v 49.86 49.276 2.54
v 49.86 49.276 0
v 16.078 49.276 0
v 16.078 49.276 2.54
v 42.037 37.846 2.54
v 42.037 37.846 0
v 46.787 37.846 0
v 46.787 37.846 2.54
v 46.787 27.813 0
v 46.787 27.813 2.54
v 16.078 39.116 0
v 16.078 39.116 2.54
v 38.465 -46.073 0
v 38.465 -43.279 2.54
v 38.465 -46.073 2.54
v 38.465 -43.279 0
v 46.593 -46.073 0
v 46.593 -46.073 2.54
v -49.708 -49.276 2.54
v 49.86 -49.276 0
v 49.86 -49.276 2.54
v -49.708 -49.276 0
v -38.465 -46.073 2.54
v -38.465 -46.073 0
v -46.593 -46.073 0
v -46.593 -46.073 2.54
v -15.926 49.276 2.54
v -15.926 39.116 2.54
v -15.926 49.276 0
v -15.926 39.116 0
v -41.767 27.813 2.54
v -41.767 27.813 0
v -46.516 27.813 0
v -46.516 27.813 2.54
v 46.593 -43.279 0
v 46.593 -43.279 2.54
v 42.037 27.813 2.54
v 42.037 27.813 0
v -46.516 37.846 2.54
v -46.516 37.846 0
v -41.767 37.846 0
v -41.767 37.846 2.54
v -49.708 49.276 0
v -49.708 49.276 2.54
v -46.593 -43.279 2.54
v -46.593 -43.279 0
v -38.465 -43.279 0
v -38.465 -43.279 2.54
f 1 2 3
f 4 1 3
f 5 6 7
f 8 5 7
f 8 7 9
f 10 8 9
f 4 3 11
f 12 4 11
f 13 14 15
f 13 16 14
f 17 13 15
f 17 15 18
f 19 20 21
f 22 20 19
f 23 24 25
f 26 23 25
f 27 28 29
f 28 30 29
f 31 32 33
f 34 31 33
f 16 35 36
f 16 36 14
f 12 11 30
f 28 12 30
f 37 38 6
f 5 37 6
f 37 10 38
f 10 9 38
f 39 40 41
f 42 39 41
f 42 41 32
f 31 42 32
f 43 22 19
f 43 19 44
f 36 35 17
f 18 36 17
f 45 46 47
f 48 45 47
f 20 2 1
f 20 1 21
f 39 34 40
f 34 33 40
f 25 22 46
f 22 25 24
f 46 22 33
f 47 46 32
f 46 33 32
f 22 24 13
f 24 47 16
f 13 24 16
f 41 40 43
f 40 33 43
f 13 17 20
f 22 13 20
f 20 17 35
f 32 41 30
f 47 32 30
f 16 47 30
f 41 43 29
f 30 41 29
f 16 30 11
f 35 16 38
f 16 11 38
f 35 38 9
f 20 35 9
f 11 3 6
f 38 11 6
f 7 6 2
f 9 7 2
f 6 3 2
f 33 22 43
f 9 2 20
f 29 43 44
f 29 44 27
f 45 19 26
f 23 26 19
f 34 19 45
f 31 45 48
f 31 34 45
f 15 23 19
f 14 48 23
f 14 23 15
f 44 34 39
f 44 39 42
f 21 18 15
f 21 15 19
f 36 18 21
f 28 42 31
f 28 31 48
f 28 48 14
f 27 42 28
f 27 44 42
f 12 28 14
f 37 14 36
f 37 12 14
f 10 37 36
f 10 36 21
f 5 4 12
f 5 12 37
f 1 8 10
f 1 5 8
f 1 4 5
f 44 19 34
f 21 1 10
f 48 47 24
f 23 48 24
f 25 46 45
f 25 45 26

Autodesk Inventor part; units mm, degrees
ref_plane "YZ Plane" through (0, 0, 0) normal (1, 0, 0) x (0, 1, 0)
ref_plane "XZ Plane" through (0, 0, 0) normal (0, 1, 0) x (-1, 0, 0)
ref_plane "XY Plane" through (0, 0, 0) normal (0, 0, 1) x (1, 0, 0)
sketch "Sketch1" plane through (0, 0, 0) normal (0, 0, 1) x (1, 0, 0)
  line L0 (49.8602, 49.276) -> (49.8602, -49.276)
  line L1 (49.8602, -49.276) -> (-49.7078, -49.276)
  line L2 (-49.7078, -49.276) -> (-49.7078, 49.276)
  line L3 (49.8602, 49.276) -> (16.0782, 49.276)
  line L4 (16.0782, 49.276) -> (16.0782, 39.116)
  line L5 (16.0782, 39.116) -> (-15.9258, 39.116)
  line L6 (-15.9258, 39.116) -> (-15.9258, 49.276)
  line L7 (-49.7078, 49.276) -> (-15.9258, 49.276)
  line L8 (16.0782, 49.276) -> (49.8602, 49.276)
  line L9 (-46.5164, 37.846) -> (-41.7666, 37.846)
  line L10 (-41.7666, 37.846) -> (-41.7666, 27.813)
  line L11 (-41.7666, 27.813) -> (-46.5164, 27.813)
  line L12 (-46.5164, 27.813) -> (-46.5164, 37.846)
  line L13 (42.037, 37.846) -> (46.7868, 37.846)
  line L14 (46.7868, 37.846) -> (46.7868, 27.813)
  line L15 (46.7868, 27.813) -> (42.037, 27.813)
  line L16 (42.037, 27.813) -> (42.037, 37.846)
  line L17 (-46.5926, -43.2793) -> (-46.5926, -46.0733)
  line L18 (-46.5926, -43.2793) -> (-38.4646, -43.2793)
  line L19 (-38.4646, -43.2793) -> (-38.4646, -46.0733)
  line L20 (-38.4646, -46.0733) -> (-46.5926, -46.0733)
  line L21 (46.5926, -43.2793) -> (38.4646, -43.2793)
  line L22 (38.4646, -43.2793) -> (38.4646, -46.0733)
  line L23 (38.4646, -46.0733) -> (46.5926, -46.0733)
  line L24 (46.5926, -43.2793) -> (46.5926, -46.0733)
  point P0 (0, 0)
  dimension "d0" = 99.568
  dimension "d1" = 98.552
  dimension "d2" = 33.782
  dimension "d3" = 10.16
  dimension "d4" = 32.004
  dimension "d9" = 4.7498
  dimension "d10" = 10.033
  dimension "d12" = 3.1914
  dimension "d13" = 4.7498
  dimension "d14" = 10.033
  dimension "d23" = 8.128
  dimension "d25" = 2.794
extrude "Extrusion3" add sketch "Sketch1" along normal blind 2.54
properties part number "RTS Frame Front Panel"
